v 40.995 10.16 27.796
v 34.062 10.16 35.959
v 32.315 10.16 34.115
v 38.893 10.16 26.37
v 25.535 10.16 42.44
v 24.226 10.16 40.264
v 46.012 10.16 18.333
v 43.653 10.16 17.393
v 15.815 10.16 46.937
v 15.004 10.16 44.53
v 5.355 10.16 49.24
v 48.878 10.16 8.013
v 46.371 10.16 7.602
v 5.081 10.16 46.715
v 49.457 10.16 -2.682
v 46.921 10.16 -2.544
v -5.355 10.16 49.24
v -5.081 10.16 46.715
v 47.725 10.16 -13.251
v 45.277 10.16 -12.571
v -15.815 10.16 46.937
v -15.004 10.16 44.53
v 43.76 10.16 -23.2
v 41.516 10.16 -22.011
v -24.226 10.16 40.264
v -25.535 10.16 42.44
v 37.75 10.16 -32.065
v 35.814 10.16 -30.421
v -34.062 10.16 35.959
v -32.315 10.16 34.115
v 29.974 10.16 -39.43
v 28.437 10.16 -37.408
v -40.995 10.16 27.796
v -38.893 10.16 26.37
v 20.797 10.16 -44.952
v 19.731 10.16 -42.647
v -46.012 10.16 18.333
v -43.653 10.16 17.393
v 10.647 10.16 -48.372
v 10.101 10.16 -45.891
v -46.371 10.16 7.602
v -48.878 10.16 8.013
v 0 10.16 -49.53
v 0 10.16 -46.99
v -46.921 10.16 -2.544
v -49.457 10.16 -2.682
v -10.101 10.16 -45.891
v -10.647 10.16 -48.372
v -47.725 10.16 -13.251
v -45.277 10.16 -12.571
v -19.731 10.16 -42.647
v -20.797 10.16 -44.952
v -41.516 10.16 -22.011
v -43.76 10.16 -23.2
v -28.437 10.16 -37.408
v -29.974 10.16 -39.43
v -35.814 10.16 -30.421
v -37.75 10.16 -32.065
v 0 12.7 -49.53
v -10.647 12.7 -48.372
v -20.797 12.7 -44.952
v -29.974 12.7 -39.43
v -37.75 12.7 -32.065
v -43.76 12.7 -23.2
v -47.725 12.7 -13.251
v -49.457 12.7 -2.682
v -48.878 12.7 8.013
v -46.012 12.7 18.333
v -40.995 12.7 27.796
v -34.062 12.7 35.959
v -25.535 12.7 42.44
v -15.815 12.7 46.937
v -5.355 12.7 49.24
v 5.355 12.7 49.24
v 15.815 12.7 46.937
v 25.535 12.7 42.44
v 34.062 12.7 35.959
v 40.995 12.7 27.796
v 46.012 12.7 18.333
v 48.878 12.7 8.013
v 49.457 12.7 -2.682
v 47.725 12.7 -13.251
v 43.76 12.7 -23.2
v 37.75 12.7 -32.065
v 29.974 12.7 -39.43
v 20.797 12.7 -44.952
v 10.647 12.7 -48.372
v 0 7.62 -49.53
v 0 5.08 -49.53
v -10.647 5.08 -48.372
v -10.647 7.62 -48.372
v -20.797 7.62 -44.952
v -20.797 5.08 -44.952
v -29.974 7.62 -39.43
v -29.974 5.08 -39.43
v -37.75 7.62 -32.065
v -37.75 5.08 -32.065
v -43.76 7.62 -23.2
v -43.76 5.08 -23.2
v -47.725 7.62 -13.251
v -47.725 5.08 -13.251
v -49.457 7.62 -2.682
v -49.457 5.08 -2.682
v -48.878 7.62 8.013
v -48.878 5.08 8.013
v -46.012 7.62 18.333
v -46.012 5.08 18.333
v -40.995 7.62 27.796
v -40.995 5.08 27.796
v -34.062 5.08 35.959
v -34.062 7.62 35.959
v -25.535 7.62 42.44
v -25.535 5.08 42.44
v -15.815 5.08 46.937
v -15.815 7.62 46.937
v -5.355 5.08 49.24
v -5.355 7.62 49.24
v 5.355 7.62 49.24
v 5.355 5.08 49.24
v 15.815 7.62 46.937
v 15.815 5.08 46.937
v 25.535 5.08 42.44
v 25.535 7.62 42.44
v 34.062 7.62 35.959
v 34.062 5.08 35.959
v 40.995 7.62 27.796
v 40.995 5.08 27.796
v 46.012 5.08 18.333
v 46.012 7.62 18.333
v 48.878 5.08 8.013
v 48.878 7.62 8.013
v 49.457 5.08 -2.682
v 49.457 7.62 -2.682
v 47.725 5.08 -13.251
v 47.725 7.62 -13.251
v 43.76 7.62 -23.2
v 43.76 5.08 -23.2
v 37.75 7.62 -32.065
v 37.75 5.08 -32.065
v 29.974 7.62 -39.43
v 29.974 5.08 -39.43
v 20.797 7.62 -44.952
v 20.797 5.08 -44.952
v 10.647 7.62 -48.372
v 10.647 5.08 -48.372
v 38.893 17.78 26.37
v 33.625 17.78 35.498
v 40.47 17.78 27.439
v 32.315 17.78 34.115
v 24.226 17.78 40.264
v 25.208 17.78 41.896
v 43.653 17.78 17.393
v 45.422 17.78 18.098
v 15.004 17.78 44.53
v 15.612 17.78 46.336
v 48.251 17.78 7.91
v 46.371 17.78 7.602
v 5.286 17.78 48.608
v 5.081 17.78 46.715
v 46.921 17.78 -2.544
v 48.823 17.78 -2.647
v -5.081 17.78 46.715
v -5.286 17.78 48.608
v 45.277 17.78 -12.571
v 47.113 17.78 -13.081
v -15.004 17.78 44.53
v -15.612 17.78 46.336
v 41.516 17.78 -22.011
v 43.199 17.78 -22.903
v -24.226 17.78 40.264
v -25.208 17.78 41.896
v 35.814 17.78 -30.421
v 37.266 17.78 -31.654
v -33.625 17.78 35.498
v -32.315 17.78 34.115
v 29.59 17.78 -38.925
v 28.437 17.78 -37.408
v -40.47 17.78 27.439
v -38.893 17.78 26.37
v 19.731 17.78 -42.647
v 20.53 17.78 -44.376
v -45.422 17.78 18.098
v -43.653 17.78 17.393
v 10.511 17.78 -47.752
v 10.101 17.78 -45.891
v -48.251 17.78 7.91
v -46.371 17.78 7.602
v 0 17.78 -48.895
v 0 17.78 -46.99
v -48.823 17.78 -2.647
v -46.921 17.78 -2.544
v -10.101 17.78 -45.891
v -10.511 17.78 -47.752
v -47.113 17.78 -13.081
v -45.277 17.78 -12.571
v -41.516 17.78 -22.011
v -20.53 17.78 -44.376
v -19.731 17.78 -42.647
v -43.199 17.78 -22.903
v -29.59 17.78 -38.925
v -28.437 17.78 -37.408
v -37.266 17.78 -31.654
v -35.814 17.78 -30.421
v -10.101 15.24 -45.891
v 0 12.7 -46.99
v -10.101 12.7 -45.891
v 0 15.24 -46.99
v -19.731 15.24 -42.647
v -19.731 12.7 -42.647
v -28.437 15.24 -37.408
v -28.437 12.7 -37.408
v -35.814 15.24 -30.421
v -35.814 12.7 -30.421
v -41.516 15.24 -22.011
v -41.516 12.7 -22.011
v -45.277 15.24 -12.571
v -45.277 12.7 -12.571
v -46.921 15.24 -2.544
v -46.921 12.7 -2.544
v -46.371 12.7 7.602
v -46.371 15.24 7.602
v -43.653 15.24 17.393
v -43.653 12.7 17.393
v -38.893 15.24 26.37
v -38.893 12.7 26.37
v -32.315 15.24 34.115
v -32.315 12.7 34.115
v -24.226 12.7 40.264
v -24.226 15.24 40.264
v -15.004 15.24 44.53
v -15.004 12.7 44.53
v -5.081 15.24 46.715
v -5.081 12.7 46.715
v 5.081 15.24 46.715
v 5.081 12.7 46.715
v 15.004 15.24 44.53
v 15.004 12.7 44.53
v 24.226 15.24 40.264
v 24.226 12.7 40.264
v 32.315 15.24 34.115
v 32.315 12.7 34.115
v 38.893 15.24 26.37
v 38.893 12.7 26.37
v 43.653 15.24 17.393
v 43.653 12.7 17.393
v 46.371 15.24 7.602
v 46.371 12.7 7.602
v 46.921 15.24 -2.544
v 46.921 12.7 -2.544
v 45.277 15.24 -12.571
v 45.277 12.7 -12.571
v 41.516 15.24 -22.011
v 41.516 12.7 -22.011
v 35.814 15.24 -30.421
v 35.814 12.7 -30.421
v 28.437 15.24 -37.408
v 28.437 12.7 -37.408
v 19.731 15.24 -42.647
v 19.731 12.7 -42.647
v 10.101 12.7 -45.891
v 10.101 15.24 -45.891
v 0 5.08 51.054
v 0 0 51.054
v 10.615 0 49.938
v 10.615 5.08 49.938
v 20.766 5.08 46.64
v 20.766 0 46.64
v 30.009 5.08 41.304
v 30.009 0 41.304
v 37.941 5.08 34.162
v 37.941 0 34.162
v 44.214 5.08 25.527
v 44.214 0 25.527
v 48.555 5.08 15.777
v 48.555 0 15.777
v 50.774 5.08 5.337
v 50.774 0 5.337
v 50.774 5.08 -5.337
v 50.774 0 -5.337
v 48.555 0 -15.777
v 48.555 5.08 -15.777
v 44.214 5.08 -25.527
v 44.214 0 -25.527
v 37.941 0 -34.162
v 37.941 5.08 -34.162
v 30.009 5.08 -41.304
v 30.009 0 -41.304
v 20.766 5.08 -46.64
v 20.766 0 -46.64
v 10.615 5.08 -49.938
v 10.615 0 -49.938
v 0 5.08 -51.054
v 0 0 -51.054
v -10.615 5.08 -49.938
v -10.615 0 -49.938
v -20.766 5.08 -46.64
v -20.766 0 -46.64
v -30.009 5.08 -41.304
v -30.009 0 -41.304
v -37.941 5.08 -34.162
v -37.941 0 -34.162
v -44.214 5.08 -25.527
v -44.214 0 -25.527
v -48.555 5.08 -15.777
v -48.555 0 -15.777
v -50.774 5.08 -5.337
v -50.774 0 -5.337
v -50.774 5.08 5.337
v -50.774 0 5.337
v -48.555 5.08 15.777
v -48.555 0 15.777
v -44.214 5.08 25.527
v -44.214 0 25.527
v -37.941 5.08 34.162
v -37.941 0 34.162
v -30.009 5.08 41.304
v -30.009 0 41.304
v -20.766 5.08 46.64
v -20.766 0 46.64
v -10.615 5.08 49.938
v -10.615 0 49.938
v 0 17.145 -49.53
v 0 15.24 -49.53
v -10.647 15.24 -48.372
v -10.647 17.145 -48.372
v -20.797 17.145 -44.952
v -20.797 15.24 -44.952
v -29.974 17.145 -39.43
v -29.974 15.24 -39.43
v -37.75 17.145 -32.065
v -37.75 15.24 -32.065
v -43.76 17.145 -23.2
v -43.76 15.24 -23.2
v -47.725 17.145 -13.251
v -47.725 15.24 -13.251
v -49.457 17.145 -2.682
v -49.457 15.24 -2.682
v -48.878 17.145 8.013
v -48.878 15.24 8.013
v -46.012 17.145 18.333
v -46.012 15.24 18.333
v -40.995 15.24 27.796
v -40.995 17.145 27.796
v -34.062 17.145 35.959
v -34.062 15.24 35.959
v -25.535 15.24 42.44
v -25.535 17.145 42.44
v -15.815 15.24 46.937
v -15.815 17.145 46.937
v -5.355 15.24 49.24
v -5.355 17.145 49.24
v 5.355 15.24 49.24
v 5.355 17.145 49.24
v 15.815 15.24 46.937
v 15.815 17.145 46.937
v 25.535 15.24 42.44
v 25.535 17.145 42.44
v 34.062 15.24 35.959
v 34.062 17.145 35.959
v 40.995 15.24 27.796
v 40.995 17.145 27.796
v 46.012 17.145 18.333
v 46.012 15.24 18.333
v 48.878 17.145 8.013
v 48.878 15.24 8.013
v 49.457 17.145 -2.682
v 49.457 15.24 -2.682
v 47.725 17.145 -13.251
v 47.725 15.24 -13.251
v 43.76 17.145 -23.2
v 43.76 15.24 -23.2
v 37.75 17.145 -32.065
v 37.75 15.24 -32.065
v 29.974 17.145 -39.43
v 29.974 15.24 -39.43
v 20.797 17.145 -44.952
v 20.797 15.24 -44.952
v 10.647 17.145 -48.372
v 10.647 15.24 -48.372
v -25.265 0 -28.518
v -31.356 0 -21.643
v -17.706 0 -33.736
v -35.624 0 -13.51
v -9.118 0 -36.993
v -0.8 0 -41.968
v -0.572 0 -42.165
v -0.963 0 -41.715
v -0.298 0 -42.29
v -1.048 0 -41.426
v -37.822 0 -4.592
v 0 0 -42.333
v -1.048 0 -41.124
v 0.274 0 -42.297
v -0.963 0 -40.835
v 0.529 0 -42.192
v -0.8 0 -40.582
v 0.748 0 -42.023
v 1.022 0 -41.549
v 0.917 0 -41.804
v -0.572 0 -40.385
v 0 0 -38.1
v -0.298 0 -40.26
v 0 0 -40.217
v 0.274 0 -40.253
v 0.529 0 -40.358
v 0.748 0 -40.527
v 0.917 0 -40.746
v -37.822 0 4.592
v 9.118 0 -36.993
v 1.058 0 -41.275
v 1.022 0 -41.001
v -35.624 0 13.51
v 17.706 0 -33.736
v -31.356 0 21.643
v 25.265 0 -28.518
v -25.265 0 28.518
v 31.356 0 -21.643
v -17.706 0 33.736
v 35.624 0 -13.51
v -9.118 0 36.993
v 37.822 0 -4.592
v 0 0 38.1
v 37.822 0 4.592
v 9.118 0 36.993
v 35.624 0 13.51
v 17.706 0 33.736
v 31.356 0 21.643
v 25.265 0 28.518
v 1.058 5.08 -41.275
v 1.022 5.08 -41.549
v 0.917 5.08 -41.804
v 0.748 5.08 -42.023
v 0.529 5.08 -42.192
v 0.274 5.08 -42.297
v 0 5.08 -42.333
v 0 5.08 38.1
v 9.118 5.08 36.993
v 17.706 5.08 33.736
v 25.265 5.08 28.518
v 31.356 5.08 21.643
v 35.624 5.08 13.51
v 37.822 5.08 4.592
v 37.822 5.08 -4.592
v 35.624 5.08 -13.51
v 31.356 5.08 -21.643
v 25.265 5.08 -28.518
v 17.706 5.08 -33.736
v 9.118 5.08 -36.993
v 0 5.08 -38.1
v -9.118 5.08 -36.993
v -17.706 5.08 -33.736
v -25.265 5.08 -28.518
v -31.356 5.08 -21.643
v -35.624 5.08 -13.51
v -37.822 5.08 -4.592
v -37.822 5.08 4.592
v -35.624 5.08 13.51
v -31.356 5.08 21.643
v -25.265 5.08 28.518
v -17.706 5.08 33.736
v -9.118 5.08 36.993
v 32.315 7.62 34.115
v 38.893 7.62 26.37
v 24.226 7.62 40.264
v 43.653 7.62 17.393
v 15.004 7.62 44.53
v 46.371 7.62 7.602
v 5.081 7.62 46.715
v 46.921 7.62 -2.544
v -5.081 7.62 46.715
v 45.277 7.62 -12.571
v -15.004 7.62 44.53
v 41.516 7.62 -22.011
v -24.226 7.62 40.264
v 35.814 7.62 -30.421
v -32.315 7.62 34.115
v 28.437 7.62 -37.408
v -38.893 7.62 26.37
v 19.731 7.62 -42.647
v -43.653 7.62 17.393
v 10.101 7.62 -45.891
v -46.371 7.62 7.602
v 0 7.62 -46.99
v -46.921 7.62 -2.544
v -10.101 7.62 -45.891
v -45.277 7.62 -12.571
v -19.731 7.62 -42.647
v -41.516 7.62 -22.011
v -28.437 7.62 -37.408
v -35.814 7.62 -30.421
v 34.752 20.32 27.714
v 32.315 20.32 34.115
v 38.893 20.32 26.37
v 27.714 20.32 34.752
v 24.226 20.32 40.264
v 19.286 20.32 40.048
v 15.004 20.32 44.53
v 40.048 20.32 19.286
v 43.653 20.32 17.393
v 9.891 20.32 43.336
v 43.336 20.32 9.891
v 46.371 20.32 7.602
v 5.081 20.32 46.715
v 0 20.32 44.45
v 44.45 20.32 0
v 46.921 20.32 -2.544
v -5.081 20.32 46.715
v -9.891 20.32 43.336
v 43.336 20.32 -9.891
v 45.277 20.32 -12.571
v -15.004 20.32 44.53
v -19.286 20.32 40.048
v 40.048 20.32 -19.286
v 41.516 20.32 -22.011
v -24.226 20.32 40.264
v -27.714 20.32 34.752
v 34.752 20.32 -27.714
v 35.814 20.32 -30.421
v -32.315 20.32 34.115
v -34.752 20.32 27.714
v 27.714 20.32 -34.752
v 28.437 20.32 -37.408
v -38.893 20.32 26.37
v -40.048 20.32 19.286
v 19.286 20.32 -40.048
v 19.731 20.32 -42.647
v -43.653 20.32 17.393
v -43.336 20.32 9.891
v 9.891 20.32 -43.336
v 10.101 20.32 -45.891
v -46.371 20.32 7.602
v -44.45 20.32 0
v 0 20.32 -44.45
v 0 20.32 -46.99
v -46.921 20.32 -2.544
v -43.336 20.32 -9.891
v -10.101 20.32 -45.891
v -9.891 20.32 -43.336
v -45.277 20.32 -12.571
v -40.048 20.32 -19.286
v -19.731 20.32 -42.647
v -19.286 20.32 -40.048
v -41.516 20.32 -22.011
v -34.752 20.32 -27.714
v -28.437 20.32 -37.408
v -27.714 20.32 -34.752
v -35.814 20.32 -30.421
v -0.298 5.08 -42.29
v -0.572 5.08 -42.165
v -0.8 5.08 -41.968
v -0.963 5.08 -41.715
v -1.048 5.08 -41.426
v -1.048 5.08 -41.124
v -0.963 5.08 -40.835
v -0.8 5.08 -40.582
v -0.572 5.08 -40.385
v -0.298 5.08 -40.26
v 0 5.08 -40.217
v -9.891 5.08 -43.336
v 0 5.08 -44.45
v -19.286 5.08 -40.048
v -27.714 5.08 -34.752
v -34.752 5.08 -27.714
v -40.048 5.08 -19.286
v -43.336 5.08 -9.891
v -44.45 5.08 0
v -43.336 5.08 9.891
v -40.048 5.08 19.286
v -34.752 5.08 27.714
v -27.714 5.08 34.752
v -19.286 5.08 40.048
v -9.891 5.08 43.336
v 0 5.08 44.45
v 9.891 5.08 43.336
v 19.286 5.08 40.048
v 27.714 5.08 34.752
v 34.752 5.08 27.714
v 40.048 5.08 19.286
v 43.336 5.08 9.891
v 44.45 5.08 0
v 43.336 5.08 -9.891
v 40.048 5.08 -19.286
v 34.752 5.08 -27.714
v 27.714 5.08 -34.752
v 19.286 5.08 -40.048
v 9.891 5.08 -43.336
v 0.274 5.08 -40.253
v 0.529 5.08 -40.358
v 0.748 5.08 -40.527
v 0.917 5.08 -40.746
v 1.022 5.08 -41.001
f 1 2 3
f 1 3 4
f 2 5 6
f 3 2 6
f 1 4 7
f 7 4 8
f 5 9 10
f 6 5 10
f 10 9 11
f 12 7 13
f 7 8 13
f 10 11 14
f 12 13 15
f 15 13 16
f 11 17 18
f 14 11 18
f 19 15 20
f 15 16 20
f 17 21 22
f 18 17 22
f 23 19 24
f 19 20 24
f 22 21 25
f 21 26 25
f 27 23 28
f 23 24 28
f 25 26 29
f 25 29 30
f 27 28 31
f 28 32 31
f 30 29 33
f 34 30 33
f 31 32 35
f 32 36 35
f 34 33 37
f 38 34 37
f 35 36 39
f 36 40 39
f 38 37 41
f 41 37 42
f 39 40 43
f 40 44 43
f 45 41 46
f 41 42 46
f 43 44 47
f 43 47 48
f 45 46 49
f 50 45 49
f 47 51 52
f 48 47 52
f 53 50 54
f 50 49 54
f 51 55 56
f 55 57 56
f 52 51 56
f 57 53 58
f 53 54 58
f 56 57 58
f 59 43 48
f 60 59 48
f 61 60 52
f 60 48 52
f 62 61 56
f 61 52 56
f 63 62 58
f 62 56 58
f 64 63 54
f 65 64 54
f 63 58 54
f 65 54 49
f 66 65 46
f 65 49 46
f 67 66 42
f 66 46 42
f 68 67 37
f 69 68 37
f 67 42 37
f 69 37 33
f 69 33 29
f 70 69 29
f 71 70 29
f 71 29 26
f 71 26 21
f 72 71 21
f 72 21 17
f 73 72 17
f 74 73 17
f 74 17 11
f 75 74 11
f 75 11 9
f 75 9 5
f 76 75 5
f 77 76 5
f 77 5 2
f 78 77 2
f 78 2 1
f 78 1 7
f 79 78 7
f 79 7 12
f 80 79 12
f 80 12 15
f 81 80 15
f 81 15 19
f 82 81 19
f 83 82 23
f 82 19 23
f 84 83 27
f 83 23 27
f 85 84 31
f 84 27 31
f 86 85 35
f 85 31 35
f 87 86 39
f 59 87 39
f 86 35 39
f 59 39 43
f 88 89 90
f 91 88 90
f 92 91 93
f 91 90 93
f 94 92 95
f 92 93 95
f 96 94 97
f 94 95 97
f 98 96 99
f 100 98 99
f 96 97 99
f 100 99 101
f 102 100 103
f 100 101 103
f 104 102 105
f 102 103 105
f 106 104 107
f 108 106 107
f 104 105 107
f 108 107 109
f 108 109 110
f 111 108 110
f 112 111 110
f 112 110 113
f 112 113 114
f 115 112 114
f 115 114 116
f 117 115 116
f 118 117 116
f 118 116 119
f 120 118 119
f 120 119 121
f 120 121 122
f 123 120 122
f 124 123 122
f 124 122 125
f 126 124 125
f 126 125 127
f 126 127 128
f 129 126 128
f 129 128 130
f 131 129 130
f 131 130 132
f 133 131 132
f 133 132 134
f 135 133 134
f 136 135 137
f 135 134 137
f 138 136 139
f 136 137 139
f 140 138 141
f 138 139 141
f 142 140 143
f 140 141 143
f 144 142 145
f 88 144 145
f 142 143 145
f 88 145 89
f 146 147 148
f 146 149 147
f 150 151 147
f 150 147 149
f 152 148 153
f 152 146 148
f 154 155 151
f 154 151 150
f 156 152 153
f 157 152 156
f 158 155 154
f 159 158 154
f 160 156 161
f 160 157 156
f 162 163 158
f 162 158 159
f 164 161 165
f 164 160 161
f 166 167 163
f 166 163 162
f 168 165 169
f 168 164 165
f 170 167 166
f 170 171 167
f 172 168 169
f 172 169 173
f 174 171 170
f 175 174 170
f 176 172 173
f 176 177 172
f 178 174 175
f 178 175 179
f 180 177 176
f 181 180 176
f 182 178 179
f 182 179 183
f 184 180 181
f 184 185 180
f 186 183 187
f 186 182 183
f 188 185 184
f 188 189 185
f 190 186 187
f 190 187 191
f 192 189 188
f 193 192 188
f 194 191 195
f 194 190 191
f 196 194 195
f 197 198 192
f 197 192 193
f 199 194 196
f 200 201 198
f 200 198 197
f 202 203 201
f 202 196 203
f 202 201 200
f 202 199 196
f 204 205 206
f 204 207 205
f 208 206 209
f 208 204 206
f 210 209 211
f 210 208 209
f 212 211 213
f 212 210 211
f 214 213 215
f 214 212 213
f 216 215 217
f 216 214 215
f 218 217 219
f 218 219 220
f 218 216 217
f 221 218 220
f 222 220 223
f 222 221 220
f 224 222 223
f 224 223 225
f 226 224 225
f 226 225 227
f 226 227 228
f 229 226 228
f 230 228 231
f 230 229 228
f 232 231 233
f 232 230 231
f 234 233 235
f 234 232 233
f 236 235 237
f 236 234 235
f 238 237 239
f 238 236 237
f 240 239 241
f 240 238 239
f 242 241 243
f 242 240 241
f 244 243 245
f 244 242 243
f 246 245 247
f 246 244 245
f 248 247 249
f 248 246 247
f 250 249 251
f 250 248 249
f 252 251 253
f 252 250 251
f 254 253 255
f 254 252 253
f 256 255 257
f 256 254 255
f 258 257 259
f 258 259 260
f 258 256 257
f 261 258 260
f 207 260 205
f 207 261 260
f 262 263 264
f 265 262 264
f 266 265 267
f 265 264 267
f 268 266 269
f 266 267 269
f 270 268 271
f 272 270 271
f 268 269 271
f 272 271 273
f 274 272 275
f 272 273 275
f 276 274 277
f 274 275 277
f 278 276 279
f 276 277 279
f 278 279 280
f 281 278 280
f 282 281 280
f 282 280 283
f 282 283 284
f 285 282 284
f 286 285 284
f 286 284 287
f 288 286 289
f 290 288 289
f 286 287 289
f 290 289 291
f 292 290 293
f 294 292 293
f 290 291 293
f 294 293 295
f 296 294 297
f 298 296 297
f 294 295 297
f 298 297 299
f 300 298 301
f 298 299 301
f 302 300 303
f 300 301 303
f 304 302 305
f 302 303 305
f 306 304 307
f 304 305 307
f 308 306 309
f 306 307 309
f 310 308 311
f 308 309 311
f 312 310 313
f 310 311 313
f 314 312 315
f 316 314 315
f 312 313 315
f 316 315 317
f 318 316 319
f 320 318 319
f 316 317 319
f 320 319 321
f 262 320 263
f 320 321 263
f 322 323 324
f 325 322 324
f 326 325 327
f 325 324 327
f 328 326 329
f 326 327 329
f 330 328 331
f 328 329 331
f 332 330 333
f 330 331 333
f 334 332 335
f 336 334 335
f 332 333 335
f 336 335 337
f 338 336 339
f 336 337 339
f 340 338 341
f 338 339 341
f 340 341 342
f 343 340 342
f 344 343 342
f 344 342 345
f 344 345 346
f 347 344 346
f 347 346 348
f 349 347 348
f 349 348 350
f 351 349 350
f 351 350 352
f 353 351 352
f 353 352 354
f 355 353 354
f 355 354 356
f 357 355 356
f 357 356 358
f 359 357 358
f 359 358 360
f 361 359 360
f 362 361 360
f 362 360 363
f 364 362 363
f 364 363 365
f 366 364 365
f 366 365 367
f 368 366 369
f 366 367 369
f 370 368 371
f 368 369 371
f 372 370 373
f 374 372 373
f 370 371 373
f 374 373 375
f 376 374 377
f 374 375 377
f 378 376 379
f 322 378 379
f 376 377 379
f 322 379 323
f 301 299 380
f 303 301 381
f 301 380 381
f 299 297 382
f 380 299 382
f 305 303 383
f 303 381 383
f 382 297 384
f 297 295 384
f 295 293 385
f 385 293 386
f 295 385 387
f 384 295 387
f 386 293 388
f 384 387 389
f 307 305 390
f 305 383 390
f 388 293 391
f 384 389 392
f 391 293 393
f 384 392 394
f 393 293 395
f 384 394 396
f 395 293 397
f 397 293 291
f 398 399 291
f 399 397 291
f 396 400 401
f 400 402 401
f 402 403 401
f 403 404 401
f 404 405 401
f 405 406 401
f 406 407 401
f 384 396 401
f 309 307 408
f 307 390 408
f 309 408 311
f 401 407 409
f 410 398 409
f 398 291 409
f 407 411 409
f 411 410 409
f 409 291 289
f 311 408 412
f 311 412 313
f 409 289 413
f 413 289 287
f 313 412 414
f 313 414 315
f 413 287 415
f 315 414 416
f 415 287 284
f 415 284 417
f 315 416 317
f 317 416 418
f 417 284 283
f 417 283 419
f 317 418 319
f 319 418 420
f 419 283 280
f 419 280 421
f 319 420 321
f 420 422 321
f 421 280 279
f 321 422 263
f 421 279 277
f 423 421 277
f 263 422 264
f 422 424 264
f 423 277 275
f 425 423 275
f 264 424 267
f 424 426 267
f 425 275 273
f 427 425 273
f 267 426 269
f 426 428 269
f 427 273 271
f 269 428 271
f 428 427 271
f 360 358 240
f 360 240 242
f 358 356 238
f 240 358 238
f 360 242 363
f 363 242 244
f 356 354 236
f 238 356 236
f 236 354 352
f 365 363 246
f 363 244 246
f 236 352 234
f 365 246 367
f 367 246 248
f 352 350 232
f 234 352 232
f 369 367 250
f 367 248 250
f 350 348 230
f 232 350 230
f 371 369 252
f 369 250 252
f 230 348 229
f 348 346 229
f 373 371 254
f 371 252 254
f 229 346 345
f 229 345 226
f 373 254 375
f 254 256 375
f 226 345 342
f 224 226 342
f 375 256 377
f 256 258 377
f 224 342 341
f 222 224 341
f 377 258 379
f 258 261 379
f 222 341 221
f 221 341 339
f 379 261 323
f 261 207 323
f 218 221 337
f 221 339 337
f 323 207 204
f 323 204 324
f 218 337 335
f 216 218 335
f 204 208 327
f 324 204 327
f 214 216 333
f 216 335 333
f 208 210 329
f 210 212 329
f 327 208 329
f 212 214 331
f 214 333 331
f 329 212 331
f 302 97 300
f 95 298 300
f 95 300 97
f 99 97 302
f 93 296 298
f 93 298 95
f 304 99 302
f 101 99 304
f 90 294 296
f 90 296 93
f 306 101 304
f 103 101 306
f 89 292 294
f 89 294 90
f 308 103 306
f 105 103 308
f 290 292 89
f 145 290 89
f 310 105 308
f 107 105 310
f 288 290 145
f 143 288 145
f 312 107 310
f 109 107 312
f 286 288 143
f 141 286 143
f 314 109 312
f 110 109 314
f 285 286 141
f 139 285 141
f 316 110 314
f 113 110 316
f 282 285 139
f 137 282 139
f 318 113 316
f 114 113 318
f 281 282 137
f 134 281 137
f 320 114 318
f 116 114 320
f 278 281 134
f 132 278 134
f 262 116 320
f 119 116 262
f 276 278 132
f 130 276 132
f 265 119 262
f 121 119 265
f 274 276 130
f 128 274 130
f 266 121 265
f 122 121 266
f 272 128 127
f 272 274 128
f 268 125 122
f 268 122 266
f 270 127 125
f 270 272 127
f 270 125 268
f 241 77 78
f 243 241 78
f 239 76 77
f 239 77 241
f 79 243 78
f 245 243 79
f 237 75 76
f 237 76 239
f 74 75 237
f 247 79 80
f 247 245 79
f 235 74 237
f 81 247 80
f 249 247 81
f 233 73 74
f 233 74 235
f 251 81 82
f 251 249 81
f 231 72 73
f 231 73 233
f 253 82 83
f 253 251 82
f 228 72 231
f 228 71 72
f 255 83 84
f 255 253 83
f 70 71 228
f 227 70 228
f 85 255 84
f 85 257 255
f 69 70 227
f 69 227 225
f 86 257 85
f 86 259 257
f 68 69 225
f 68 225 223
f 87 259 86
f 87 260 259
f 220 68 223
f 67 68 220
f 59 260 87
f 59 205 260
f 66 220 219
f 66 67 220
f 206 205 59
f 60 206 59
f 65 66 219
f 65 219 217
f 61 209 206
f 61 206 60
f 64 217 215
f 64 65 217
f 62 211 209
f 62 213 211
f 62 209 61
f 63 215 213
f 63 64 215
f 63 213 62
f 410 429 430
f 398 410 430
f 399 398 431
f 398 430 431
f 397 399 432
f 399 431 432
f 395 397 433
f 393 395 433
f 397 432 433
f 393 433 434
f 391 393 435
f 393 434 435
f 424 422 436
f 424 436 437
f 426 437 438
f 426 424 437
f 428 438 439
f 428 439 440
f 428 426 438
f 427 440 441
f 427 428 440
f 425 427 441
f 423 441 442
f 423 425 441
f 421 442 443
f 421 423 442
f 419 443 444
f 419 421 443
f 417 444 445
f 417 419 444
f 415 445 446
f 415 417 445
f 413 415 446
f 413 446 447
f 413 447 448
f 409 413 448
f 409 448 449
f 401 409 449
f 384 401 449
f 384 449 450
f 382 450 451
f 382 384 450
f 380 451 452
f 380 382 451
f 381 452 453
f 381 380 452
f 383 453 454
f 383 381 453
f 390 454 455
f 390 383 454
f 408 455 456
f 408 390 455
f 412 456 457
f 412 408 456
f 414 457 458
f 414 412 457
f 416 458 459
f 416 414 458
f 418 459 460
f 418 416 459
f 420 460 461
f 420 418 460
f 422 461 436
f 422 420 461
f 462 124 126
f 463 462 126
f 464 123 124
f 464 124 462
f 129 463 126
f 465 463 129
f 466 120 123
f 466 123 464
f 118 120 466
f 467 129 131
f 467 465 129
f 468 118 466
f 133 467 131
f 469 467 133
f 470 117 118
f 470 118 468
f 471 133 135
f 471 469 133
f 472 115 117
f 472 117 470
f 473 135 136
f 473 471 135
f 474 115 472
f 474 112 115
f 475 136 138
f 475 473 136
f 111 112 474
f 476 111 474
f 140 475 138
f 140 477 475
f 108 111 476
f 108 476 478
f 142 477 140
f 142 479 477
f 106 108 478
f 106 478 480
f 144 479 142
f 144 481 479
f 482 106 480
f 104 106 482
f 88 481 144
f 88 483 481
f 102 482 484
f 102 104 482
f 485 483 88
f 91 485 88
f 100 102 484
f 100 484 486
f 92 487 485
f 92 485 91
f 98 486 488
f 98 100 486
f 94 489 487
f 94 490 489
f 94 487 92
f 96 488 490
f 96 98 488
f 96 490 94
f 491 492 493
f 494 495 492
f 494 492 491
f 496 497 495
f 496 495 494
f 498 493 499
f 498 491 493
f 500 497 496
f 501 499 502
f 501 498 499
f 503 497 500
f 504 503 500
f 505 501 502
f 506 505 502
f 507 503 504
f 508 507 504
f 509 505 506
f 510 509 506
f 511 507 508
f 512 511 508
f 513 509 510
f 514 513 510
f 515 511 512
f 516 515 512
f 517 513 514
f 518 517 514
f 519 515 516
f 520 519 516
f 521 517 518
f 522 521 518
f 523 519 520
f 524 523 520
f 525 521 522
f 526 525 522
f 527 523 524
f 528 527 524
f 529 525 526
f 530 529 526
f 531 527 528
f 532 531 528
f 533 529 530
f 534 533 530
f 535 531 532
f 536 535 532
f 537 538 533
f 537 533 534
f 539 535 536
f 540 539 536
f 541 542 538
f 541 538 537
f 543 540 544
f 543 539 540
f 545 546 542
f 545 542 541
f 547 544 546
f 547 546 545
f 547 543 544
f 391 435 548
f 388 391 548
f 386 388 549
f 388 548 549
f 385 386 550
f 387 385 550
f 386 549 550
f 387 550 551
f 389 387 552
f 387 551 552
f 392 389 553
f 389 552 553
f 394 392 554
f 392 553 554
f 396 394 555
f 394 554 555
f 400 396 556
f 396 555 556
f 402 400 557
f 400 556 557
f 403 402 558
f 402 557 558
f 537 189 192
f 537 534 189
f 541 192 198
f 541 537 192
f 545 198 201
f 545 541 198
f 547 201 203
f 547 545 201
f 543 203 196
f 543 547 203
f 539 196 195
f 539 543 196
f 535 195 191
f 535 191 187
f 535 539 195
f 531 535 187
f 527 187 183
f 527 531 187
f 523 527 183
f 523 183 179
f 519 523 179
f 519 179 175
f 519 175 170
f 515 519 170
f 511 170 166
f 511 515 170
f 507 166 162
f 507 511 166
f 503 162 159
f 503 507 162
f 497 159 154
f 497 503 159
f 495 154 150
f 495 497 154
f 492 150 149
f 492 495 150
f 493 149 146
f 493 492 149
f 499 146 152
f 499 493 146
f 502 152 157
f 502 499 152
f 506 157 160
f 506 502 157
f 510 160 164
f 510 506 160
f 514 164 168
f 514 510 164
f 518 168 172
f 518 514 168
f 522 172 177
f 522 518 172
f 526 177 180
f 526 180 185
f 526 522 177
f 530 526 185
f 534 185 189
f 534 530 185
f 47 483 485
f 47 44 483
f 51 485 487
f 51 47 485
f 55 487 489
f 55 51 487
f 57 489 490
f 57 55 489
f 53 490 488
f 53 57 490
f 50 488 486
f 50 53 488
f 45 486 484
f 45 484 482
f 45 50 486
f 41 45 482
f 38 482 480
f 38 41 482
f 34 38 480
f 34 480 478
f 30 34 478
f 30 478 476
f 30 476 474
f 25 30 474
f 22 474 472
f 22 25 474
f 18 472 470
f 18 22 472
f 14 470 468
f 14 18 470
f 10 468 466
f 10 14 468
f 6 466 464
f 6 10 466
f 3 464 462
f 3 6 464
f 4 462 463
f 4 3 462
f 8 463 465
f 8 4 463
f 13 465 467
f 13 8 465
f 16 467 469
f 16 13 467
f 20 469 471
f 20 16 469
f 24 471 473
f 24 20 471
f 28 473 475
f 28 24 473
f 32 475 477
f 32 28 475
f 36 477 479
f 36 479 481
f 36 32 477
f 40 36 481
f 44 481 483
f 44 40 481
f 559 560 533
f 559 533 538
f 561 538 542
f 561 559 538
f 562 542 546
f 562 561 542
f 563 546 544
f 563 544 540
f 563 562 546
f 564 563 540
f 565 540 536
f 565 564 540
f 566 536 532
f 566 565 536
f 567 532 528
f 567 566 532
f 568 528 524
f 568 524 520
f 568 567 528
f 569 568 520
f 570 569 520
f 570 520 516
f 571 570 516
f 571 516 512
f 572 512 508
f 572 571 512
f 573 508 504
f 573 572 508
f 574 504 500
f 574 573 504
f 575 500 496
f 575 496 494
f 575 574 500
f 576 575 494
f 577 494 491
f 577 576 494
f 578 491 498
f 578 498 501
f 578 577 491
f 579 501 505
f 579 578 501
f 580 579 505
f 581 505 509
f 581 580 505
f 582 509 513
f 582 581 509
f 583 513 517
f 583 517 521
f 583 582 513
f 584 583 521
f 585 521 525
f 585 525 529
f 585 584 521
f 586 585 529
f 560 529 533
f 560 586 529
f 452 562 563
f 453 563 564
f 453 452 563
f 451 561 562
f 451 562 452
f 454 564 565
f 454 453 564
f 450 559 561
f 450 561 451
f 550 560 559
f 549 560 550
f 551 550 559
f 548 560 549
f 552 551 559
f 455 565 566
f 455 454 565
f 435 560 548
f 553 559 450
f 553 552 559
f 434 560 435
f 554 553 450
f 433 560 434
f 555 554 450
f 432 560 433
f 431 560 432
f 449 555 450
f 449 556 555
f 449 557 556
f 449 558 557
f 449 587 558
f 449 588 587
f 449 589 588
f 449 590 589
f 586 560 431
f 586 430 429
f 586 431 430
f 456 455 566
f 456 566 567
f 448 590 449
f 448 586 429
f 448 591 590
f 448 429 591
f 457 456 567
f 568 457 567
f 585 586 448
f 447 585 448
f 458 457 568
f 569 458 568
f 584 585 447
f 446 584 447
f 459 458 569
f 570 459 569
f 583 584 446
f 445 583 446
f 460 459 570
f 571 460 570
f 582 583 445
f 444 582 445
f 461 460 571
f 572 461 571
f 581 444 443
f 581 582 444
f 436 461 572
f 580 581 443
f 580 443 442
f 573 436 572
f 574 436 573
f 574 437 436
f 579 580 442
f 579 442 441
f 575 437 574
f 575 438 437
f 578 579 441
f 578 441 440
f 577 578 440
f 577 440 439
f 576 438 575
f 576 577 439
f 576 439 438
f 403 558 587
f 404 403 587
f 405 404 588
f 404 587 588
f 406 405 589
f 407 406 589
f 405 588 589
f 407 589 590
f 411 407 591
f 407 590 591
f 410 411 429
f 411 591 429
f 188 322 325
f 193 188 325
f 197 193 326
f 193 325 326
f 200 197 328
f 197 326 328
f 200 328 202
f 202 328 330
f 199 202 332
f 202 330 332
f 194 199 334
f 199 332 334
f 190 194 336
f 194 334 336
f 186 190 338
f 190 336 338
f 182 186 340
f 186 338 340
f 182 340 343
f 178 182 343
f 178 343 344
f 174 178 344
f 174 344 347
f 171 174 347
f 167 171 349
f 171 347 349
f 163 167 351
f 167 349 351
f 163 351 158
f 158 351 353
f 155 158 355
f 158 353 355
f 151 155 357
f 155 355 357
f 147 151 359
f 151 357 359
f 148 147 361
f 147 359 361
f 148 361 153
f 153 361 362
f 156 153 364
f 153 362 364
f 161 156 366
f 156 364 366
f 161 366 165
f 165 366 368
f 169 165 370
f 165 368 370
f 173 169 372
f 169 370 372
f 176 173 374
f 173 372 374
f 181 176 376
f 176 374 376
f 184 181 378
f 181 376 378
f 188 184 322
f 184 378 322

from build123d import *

# Parameters (mm, degrees)
SKETCH1_R           = 51.054
SKETCH1_R_2         = 38.1
BOSS_EXTRUDE1_DEPTH = 5.08
SKETCH2_R           = 49.53
SKETCH2_R_2         = 44.45
BOSS_EXTRUDE2_DEPTH = 15.24
SKETCH4_W           = 2.54
SKETCH4_H           = 2.54
CHAMFER1_SIZE       = 0.635
CUT_EXTRUDE1_DEPTH  = 26.67


with BuildPart() as part:
    # Sketch1 → Boss-Extrude1 (new body)
    with BuildSketch(Plane(origin=(0, 0, 0), x_dir=(1, 0, 0), z_dir=(0, 1, 0))):
        with Locations(Location((0, 0, 0), (0, 0, 270))):
            Circle(SKETCH1_R)
        with Locations(Location((0, 0, 0), (0, 0, 270))):
            Circle(SKETCH1_R_2, mode=Mode.SUBTRACT)
    extrude(amount=BOSS_EXTRUDE1_DEPTH)

    # Sketch2 → Boss-Extrude2 (add)
    with BuildSketch(Plane(origin=(0, 5.08, 0), x_dir=(1, 0, 0), z_dir=(0, 1, 0))):
        with Locations(Location((0, 0, 0), (0, 0, 90))):
            Circle(SKETCH2_R)
        with Locations(Location((0, 0, 0), (0, 0, 90))):
            Circle(SKETCH2_R_2, mode=Mode.SUBTRACT)
    extrude(amount=BOSS_EXTRUDE2_DEPTH)

    # Sketch4 → Cut-Revolve1 (revolve, cut)
    with BuildSketch(Plane.XY, mode=Mode.PRIVATE) as cut_revolve1_sk:
        with Locations((-48.26, 8.89)):
            Rectangle(SKETCH4_W, SKETCH4_H)
        with Locations((-48.26, 13.97)):
            Rectangle(SKETCH4_W, SKETCH4_H)
        with Locations((-48.26, 19.05)):
            Rectangle(SKETCH4_W, SKETCH4_H)
    revolve(cut_revolve1_sk.sketch.rotate(Axis((0, 0, 0), (0, 1, 0)), 270), axis=Axis((0, 0, 0), (0, 1, 0)), mode=Mode.SUBTRACT)

    # Chamfer1
    chamfer1_edges = [part.edges().sort_by_distance(p)[0] for p in [
        (0, 17.78, 49.53),
    ]]
    chamfer(chamfer1_edges, length=CHAMFER1_SIZE)

    # Sketch5 → Cut-Extrude1 (cut)
    with BuildSketch(Plane(origin=(0, 5.08, 0), x_dir=(1, 0, 0), z_dir=(0, 1, 0))):
        with BuildLine():
            ThreePointArc((0, 42.333333164), (-1.058333164, 41.275), (0, 40.216666836))
            Line((0, 40.216666836), (0, 42.333333164))
        make_face()
        with BuildLine():
            Line((0, 42.333333164), (0, 40.216666836))
            ThreePointArc((0, 40.216666836), (0.748354557, 40.526645443), (1.058333164, 41.275))
            ThreePointArc((1.058333164, 41.275), (0.748354557, 42.023354557), (0, 42.333333164))
        make_face()
    extrude(amount=-CUT_EXTRUDE1_DEPTH, mode=Mode.SUBTRACT)


solid = part.part
